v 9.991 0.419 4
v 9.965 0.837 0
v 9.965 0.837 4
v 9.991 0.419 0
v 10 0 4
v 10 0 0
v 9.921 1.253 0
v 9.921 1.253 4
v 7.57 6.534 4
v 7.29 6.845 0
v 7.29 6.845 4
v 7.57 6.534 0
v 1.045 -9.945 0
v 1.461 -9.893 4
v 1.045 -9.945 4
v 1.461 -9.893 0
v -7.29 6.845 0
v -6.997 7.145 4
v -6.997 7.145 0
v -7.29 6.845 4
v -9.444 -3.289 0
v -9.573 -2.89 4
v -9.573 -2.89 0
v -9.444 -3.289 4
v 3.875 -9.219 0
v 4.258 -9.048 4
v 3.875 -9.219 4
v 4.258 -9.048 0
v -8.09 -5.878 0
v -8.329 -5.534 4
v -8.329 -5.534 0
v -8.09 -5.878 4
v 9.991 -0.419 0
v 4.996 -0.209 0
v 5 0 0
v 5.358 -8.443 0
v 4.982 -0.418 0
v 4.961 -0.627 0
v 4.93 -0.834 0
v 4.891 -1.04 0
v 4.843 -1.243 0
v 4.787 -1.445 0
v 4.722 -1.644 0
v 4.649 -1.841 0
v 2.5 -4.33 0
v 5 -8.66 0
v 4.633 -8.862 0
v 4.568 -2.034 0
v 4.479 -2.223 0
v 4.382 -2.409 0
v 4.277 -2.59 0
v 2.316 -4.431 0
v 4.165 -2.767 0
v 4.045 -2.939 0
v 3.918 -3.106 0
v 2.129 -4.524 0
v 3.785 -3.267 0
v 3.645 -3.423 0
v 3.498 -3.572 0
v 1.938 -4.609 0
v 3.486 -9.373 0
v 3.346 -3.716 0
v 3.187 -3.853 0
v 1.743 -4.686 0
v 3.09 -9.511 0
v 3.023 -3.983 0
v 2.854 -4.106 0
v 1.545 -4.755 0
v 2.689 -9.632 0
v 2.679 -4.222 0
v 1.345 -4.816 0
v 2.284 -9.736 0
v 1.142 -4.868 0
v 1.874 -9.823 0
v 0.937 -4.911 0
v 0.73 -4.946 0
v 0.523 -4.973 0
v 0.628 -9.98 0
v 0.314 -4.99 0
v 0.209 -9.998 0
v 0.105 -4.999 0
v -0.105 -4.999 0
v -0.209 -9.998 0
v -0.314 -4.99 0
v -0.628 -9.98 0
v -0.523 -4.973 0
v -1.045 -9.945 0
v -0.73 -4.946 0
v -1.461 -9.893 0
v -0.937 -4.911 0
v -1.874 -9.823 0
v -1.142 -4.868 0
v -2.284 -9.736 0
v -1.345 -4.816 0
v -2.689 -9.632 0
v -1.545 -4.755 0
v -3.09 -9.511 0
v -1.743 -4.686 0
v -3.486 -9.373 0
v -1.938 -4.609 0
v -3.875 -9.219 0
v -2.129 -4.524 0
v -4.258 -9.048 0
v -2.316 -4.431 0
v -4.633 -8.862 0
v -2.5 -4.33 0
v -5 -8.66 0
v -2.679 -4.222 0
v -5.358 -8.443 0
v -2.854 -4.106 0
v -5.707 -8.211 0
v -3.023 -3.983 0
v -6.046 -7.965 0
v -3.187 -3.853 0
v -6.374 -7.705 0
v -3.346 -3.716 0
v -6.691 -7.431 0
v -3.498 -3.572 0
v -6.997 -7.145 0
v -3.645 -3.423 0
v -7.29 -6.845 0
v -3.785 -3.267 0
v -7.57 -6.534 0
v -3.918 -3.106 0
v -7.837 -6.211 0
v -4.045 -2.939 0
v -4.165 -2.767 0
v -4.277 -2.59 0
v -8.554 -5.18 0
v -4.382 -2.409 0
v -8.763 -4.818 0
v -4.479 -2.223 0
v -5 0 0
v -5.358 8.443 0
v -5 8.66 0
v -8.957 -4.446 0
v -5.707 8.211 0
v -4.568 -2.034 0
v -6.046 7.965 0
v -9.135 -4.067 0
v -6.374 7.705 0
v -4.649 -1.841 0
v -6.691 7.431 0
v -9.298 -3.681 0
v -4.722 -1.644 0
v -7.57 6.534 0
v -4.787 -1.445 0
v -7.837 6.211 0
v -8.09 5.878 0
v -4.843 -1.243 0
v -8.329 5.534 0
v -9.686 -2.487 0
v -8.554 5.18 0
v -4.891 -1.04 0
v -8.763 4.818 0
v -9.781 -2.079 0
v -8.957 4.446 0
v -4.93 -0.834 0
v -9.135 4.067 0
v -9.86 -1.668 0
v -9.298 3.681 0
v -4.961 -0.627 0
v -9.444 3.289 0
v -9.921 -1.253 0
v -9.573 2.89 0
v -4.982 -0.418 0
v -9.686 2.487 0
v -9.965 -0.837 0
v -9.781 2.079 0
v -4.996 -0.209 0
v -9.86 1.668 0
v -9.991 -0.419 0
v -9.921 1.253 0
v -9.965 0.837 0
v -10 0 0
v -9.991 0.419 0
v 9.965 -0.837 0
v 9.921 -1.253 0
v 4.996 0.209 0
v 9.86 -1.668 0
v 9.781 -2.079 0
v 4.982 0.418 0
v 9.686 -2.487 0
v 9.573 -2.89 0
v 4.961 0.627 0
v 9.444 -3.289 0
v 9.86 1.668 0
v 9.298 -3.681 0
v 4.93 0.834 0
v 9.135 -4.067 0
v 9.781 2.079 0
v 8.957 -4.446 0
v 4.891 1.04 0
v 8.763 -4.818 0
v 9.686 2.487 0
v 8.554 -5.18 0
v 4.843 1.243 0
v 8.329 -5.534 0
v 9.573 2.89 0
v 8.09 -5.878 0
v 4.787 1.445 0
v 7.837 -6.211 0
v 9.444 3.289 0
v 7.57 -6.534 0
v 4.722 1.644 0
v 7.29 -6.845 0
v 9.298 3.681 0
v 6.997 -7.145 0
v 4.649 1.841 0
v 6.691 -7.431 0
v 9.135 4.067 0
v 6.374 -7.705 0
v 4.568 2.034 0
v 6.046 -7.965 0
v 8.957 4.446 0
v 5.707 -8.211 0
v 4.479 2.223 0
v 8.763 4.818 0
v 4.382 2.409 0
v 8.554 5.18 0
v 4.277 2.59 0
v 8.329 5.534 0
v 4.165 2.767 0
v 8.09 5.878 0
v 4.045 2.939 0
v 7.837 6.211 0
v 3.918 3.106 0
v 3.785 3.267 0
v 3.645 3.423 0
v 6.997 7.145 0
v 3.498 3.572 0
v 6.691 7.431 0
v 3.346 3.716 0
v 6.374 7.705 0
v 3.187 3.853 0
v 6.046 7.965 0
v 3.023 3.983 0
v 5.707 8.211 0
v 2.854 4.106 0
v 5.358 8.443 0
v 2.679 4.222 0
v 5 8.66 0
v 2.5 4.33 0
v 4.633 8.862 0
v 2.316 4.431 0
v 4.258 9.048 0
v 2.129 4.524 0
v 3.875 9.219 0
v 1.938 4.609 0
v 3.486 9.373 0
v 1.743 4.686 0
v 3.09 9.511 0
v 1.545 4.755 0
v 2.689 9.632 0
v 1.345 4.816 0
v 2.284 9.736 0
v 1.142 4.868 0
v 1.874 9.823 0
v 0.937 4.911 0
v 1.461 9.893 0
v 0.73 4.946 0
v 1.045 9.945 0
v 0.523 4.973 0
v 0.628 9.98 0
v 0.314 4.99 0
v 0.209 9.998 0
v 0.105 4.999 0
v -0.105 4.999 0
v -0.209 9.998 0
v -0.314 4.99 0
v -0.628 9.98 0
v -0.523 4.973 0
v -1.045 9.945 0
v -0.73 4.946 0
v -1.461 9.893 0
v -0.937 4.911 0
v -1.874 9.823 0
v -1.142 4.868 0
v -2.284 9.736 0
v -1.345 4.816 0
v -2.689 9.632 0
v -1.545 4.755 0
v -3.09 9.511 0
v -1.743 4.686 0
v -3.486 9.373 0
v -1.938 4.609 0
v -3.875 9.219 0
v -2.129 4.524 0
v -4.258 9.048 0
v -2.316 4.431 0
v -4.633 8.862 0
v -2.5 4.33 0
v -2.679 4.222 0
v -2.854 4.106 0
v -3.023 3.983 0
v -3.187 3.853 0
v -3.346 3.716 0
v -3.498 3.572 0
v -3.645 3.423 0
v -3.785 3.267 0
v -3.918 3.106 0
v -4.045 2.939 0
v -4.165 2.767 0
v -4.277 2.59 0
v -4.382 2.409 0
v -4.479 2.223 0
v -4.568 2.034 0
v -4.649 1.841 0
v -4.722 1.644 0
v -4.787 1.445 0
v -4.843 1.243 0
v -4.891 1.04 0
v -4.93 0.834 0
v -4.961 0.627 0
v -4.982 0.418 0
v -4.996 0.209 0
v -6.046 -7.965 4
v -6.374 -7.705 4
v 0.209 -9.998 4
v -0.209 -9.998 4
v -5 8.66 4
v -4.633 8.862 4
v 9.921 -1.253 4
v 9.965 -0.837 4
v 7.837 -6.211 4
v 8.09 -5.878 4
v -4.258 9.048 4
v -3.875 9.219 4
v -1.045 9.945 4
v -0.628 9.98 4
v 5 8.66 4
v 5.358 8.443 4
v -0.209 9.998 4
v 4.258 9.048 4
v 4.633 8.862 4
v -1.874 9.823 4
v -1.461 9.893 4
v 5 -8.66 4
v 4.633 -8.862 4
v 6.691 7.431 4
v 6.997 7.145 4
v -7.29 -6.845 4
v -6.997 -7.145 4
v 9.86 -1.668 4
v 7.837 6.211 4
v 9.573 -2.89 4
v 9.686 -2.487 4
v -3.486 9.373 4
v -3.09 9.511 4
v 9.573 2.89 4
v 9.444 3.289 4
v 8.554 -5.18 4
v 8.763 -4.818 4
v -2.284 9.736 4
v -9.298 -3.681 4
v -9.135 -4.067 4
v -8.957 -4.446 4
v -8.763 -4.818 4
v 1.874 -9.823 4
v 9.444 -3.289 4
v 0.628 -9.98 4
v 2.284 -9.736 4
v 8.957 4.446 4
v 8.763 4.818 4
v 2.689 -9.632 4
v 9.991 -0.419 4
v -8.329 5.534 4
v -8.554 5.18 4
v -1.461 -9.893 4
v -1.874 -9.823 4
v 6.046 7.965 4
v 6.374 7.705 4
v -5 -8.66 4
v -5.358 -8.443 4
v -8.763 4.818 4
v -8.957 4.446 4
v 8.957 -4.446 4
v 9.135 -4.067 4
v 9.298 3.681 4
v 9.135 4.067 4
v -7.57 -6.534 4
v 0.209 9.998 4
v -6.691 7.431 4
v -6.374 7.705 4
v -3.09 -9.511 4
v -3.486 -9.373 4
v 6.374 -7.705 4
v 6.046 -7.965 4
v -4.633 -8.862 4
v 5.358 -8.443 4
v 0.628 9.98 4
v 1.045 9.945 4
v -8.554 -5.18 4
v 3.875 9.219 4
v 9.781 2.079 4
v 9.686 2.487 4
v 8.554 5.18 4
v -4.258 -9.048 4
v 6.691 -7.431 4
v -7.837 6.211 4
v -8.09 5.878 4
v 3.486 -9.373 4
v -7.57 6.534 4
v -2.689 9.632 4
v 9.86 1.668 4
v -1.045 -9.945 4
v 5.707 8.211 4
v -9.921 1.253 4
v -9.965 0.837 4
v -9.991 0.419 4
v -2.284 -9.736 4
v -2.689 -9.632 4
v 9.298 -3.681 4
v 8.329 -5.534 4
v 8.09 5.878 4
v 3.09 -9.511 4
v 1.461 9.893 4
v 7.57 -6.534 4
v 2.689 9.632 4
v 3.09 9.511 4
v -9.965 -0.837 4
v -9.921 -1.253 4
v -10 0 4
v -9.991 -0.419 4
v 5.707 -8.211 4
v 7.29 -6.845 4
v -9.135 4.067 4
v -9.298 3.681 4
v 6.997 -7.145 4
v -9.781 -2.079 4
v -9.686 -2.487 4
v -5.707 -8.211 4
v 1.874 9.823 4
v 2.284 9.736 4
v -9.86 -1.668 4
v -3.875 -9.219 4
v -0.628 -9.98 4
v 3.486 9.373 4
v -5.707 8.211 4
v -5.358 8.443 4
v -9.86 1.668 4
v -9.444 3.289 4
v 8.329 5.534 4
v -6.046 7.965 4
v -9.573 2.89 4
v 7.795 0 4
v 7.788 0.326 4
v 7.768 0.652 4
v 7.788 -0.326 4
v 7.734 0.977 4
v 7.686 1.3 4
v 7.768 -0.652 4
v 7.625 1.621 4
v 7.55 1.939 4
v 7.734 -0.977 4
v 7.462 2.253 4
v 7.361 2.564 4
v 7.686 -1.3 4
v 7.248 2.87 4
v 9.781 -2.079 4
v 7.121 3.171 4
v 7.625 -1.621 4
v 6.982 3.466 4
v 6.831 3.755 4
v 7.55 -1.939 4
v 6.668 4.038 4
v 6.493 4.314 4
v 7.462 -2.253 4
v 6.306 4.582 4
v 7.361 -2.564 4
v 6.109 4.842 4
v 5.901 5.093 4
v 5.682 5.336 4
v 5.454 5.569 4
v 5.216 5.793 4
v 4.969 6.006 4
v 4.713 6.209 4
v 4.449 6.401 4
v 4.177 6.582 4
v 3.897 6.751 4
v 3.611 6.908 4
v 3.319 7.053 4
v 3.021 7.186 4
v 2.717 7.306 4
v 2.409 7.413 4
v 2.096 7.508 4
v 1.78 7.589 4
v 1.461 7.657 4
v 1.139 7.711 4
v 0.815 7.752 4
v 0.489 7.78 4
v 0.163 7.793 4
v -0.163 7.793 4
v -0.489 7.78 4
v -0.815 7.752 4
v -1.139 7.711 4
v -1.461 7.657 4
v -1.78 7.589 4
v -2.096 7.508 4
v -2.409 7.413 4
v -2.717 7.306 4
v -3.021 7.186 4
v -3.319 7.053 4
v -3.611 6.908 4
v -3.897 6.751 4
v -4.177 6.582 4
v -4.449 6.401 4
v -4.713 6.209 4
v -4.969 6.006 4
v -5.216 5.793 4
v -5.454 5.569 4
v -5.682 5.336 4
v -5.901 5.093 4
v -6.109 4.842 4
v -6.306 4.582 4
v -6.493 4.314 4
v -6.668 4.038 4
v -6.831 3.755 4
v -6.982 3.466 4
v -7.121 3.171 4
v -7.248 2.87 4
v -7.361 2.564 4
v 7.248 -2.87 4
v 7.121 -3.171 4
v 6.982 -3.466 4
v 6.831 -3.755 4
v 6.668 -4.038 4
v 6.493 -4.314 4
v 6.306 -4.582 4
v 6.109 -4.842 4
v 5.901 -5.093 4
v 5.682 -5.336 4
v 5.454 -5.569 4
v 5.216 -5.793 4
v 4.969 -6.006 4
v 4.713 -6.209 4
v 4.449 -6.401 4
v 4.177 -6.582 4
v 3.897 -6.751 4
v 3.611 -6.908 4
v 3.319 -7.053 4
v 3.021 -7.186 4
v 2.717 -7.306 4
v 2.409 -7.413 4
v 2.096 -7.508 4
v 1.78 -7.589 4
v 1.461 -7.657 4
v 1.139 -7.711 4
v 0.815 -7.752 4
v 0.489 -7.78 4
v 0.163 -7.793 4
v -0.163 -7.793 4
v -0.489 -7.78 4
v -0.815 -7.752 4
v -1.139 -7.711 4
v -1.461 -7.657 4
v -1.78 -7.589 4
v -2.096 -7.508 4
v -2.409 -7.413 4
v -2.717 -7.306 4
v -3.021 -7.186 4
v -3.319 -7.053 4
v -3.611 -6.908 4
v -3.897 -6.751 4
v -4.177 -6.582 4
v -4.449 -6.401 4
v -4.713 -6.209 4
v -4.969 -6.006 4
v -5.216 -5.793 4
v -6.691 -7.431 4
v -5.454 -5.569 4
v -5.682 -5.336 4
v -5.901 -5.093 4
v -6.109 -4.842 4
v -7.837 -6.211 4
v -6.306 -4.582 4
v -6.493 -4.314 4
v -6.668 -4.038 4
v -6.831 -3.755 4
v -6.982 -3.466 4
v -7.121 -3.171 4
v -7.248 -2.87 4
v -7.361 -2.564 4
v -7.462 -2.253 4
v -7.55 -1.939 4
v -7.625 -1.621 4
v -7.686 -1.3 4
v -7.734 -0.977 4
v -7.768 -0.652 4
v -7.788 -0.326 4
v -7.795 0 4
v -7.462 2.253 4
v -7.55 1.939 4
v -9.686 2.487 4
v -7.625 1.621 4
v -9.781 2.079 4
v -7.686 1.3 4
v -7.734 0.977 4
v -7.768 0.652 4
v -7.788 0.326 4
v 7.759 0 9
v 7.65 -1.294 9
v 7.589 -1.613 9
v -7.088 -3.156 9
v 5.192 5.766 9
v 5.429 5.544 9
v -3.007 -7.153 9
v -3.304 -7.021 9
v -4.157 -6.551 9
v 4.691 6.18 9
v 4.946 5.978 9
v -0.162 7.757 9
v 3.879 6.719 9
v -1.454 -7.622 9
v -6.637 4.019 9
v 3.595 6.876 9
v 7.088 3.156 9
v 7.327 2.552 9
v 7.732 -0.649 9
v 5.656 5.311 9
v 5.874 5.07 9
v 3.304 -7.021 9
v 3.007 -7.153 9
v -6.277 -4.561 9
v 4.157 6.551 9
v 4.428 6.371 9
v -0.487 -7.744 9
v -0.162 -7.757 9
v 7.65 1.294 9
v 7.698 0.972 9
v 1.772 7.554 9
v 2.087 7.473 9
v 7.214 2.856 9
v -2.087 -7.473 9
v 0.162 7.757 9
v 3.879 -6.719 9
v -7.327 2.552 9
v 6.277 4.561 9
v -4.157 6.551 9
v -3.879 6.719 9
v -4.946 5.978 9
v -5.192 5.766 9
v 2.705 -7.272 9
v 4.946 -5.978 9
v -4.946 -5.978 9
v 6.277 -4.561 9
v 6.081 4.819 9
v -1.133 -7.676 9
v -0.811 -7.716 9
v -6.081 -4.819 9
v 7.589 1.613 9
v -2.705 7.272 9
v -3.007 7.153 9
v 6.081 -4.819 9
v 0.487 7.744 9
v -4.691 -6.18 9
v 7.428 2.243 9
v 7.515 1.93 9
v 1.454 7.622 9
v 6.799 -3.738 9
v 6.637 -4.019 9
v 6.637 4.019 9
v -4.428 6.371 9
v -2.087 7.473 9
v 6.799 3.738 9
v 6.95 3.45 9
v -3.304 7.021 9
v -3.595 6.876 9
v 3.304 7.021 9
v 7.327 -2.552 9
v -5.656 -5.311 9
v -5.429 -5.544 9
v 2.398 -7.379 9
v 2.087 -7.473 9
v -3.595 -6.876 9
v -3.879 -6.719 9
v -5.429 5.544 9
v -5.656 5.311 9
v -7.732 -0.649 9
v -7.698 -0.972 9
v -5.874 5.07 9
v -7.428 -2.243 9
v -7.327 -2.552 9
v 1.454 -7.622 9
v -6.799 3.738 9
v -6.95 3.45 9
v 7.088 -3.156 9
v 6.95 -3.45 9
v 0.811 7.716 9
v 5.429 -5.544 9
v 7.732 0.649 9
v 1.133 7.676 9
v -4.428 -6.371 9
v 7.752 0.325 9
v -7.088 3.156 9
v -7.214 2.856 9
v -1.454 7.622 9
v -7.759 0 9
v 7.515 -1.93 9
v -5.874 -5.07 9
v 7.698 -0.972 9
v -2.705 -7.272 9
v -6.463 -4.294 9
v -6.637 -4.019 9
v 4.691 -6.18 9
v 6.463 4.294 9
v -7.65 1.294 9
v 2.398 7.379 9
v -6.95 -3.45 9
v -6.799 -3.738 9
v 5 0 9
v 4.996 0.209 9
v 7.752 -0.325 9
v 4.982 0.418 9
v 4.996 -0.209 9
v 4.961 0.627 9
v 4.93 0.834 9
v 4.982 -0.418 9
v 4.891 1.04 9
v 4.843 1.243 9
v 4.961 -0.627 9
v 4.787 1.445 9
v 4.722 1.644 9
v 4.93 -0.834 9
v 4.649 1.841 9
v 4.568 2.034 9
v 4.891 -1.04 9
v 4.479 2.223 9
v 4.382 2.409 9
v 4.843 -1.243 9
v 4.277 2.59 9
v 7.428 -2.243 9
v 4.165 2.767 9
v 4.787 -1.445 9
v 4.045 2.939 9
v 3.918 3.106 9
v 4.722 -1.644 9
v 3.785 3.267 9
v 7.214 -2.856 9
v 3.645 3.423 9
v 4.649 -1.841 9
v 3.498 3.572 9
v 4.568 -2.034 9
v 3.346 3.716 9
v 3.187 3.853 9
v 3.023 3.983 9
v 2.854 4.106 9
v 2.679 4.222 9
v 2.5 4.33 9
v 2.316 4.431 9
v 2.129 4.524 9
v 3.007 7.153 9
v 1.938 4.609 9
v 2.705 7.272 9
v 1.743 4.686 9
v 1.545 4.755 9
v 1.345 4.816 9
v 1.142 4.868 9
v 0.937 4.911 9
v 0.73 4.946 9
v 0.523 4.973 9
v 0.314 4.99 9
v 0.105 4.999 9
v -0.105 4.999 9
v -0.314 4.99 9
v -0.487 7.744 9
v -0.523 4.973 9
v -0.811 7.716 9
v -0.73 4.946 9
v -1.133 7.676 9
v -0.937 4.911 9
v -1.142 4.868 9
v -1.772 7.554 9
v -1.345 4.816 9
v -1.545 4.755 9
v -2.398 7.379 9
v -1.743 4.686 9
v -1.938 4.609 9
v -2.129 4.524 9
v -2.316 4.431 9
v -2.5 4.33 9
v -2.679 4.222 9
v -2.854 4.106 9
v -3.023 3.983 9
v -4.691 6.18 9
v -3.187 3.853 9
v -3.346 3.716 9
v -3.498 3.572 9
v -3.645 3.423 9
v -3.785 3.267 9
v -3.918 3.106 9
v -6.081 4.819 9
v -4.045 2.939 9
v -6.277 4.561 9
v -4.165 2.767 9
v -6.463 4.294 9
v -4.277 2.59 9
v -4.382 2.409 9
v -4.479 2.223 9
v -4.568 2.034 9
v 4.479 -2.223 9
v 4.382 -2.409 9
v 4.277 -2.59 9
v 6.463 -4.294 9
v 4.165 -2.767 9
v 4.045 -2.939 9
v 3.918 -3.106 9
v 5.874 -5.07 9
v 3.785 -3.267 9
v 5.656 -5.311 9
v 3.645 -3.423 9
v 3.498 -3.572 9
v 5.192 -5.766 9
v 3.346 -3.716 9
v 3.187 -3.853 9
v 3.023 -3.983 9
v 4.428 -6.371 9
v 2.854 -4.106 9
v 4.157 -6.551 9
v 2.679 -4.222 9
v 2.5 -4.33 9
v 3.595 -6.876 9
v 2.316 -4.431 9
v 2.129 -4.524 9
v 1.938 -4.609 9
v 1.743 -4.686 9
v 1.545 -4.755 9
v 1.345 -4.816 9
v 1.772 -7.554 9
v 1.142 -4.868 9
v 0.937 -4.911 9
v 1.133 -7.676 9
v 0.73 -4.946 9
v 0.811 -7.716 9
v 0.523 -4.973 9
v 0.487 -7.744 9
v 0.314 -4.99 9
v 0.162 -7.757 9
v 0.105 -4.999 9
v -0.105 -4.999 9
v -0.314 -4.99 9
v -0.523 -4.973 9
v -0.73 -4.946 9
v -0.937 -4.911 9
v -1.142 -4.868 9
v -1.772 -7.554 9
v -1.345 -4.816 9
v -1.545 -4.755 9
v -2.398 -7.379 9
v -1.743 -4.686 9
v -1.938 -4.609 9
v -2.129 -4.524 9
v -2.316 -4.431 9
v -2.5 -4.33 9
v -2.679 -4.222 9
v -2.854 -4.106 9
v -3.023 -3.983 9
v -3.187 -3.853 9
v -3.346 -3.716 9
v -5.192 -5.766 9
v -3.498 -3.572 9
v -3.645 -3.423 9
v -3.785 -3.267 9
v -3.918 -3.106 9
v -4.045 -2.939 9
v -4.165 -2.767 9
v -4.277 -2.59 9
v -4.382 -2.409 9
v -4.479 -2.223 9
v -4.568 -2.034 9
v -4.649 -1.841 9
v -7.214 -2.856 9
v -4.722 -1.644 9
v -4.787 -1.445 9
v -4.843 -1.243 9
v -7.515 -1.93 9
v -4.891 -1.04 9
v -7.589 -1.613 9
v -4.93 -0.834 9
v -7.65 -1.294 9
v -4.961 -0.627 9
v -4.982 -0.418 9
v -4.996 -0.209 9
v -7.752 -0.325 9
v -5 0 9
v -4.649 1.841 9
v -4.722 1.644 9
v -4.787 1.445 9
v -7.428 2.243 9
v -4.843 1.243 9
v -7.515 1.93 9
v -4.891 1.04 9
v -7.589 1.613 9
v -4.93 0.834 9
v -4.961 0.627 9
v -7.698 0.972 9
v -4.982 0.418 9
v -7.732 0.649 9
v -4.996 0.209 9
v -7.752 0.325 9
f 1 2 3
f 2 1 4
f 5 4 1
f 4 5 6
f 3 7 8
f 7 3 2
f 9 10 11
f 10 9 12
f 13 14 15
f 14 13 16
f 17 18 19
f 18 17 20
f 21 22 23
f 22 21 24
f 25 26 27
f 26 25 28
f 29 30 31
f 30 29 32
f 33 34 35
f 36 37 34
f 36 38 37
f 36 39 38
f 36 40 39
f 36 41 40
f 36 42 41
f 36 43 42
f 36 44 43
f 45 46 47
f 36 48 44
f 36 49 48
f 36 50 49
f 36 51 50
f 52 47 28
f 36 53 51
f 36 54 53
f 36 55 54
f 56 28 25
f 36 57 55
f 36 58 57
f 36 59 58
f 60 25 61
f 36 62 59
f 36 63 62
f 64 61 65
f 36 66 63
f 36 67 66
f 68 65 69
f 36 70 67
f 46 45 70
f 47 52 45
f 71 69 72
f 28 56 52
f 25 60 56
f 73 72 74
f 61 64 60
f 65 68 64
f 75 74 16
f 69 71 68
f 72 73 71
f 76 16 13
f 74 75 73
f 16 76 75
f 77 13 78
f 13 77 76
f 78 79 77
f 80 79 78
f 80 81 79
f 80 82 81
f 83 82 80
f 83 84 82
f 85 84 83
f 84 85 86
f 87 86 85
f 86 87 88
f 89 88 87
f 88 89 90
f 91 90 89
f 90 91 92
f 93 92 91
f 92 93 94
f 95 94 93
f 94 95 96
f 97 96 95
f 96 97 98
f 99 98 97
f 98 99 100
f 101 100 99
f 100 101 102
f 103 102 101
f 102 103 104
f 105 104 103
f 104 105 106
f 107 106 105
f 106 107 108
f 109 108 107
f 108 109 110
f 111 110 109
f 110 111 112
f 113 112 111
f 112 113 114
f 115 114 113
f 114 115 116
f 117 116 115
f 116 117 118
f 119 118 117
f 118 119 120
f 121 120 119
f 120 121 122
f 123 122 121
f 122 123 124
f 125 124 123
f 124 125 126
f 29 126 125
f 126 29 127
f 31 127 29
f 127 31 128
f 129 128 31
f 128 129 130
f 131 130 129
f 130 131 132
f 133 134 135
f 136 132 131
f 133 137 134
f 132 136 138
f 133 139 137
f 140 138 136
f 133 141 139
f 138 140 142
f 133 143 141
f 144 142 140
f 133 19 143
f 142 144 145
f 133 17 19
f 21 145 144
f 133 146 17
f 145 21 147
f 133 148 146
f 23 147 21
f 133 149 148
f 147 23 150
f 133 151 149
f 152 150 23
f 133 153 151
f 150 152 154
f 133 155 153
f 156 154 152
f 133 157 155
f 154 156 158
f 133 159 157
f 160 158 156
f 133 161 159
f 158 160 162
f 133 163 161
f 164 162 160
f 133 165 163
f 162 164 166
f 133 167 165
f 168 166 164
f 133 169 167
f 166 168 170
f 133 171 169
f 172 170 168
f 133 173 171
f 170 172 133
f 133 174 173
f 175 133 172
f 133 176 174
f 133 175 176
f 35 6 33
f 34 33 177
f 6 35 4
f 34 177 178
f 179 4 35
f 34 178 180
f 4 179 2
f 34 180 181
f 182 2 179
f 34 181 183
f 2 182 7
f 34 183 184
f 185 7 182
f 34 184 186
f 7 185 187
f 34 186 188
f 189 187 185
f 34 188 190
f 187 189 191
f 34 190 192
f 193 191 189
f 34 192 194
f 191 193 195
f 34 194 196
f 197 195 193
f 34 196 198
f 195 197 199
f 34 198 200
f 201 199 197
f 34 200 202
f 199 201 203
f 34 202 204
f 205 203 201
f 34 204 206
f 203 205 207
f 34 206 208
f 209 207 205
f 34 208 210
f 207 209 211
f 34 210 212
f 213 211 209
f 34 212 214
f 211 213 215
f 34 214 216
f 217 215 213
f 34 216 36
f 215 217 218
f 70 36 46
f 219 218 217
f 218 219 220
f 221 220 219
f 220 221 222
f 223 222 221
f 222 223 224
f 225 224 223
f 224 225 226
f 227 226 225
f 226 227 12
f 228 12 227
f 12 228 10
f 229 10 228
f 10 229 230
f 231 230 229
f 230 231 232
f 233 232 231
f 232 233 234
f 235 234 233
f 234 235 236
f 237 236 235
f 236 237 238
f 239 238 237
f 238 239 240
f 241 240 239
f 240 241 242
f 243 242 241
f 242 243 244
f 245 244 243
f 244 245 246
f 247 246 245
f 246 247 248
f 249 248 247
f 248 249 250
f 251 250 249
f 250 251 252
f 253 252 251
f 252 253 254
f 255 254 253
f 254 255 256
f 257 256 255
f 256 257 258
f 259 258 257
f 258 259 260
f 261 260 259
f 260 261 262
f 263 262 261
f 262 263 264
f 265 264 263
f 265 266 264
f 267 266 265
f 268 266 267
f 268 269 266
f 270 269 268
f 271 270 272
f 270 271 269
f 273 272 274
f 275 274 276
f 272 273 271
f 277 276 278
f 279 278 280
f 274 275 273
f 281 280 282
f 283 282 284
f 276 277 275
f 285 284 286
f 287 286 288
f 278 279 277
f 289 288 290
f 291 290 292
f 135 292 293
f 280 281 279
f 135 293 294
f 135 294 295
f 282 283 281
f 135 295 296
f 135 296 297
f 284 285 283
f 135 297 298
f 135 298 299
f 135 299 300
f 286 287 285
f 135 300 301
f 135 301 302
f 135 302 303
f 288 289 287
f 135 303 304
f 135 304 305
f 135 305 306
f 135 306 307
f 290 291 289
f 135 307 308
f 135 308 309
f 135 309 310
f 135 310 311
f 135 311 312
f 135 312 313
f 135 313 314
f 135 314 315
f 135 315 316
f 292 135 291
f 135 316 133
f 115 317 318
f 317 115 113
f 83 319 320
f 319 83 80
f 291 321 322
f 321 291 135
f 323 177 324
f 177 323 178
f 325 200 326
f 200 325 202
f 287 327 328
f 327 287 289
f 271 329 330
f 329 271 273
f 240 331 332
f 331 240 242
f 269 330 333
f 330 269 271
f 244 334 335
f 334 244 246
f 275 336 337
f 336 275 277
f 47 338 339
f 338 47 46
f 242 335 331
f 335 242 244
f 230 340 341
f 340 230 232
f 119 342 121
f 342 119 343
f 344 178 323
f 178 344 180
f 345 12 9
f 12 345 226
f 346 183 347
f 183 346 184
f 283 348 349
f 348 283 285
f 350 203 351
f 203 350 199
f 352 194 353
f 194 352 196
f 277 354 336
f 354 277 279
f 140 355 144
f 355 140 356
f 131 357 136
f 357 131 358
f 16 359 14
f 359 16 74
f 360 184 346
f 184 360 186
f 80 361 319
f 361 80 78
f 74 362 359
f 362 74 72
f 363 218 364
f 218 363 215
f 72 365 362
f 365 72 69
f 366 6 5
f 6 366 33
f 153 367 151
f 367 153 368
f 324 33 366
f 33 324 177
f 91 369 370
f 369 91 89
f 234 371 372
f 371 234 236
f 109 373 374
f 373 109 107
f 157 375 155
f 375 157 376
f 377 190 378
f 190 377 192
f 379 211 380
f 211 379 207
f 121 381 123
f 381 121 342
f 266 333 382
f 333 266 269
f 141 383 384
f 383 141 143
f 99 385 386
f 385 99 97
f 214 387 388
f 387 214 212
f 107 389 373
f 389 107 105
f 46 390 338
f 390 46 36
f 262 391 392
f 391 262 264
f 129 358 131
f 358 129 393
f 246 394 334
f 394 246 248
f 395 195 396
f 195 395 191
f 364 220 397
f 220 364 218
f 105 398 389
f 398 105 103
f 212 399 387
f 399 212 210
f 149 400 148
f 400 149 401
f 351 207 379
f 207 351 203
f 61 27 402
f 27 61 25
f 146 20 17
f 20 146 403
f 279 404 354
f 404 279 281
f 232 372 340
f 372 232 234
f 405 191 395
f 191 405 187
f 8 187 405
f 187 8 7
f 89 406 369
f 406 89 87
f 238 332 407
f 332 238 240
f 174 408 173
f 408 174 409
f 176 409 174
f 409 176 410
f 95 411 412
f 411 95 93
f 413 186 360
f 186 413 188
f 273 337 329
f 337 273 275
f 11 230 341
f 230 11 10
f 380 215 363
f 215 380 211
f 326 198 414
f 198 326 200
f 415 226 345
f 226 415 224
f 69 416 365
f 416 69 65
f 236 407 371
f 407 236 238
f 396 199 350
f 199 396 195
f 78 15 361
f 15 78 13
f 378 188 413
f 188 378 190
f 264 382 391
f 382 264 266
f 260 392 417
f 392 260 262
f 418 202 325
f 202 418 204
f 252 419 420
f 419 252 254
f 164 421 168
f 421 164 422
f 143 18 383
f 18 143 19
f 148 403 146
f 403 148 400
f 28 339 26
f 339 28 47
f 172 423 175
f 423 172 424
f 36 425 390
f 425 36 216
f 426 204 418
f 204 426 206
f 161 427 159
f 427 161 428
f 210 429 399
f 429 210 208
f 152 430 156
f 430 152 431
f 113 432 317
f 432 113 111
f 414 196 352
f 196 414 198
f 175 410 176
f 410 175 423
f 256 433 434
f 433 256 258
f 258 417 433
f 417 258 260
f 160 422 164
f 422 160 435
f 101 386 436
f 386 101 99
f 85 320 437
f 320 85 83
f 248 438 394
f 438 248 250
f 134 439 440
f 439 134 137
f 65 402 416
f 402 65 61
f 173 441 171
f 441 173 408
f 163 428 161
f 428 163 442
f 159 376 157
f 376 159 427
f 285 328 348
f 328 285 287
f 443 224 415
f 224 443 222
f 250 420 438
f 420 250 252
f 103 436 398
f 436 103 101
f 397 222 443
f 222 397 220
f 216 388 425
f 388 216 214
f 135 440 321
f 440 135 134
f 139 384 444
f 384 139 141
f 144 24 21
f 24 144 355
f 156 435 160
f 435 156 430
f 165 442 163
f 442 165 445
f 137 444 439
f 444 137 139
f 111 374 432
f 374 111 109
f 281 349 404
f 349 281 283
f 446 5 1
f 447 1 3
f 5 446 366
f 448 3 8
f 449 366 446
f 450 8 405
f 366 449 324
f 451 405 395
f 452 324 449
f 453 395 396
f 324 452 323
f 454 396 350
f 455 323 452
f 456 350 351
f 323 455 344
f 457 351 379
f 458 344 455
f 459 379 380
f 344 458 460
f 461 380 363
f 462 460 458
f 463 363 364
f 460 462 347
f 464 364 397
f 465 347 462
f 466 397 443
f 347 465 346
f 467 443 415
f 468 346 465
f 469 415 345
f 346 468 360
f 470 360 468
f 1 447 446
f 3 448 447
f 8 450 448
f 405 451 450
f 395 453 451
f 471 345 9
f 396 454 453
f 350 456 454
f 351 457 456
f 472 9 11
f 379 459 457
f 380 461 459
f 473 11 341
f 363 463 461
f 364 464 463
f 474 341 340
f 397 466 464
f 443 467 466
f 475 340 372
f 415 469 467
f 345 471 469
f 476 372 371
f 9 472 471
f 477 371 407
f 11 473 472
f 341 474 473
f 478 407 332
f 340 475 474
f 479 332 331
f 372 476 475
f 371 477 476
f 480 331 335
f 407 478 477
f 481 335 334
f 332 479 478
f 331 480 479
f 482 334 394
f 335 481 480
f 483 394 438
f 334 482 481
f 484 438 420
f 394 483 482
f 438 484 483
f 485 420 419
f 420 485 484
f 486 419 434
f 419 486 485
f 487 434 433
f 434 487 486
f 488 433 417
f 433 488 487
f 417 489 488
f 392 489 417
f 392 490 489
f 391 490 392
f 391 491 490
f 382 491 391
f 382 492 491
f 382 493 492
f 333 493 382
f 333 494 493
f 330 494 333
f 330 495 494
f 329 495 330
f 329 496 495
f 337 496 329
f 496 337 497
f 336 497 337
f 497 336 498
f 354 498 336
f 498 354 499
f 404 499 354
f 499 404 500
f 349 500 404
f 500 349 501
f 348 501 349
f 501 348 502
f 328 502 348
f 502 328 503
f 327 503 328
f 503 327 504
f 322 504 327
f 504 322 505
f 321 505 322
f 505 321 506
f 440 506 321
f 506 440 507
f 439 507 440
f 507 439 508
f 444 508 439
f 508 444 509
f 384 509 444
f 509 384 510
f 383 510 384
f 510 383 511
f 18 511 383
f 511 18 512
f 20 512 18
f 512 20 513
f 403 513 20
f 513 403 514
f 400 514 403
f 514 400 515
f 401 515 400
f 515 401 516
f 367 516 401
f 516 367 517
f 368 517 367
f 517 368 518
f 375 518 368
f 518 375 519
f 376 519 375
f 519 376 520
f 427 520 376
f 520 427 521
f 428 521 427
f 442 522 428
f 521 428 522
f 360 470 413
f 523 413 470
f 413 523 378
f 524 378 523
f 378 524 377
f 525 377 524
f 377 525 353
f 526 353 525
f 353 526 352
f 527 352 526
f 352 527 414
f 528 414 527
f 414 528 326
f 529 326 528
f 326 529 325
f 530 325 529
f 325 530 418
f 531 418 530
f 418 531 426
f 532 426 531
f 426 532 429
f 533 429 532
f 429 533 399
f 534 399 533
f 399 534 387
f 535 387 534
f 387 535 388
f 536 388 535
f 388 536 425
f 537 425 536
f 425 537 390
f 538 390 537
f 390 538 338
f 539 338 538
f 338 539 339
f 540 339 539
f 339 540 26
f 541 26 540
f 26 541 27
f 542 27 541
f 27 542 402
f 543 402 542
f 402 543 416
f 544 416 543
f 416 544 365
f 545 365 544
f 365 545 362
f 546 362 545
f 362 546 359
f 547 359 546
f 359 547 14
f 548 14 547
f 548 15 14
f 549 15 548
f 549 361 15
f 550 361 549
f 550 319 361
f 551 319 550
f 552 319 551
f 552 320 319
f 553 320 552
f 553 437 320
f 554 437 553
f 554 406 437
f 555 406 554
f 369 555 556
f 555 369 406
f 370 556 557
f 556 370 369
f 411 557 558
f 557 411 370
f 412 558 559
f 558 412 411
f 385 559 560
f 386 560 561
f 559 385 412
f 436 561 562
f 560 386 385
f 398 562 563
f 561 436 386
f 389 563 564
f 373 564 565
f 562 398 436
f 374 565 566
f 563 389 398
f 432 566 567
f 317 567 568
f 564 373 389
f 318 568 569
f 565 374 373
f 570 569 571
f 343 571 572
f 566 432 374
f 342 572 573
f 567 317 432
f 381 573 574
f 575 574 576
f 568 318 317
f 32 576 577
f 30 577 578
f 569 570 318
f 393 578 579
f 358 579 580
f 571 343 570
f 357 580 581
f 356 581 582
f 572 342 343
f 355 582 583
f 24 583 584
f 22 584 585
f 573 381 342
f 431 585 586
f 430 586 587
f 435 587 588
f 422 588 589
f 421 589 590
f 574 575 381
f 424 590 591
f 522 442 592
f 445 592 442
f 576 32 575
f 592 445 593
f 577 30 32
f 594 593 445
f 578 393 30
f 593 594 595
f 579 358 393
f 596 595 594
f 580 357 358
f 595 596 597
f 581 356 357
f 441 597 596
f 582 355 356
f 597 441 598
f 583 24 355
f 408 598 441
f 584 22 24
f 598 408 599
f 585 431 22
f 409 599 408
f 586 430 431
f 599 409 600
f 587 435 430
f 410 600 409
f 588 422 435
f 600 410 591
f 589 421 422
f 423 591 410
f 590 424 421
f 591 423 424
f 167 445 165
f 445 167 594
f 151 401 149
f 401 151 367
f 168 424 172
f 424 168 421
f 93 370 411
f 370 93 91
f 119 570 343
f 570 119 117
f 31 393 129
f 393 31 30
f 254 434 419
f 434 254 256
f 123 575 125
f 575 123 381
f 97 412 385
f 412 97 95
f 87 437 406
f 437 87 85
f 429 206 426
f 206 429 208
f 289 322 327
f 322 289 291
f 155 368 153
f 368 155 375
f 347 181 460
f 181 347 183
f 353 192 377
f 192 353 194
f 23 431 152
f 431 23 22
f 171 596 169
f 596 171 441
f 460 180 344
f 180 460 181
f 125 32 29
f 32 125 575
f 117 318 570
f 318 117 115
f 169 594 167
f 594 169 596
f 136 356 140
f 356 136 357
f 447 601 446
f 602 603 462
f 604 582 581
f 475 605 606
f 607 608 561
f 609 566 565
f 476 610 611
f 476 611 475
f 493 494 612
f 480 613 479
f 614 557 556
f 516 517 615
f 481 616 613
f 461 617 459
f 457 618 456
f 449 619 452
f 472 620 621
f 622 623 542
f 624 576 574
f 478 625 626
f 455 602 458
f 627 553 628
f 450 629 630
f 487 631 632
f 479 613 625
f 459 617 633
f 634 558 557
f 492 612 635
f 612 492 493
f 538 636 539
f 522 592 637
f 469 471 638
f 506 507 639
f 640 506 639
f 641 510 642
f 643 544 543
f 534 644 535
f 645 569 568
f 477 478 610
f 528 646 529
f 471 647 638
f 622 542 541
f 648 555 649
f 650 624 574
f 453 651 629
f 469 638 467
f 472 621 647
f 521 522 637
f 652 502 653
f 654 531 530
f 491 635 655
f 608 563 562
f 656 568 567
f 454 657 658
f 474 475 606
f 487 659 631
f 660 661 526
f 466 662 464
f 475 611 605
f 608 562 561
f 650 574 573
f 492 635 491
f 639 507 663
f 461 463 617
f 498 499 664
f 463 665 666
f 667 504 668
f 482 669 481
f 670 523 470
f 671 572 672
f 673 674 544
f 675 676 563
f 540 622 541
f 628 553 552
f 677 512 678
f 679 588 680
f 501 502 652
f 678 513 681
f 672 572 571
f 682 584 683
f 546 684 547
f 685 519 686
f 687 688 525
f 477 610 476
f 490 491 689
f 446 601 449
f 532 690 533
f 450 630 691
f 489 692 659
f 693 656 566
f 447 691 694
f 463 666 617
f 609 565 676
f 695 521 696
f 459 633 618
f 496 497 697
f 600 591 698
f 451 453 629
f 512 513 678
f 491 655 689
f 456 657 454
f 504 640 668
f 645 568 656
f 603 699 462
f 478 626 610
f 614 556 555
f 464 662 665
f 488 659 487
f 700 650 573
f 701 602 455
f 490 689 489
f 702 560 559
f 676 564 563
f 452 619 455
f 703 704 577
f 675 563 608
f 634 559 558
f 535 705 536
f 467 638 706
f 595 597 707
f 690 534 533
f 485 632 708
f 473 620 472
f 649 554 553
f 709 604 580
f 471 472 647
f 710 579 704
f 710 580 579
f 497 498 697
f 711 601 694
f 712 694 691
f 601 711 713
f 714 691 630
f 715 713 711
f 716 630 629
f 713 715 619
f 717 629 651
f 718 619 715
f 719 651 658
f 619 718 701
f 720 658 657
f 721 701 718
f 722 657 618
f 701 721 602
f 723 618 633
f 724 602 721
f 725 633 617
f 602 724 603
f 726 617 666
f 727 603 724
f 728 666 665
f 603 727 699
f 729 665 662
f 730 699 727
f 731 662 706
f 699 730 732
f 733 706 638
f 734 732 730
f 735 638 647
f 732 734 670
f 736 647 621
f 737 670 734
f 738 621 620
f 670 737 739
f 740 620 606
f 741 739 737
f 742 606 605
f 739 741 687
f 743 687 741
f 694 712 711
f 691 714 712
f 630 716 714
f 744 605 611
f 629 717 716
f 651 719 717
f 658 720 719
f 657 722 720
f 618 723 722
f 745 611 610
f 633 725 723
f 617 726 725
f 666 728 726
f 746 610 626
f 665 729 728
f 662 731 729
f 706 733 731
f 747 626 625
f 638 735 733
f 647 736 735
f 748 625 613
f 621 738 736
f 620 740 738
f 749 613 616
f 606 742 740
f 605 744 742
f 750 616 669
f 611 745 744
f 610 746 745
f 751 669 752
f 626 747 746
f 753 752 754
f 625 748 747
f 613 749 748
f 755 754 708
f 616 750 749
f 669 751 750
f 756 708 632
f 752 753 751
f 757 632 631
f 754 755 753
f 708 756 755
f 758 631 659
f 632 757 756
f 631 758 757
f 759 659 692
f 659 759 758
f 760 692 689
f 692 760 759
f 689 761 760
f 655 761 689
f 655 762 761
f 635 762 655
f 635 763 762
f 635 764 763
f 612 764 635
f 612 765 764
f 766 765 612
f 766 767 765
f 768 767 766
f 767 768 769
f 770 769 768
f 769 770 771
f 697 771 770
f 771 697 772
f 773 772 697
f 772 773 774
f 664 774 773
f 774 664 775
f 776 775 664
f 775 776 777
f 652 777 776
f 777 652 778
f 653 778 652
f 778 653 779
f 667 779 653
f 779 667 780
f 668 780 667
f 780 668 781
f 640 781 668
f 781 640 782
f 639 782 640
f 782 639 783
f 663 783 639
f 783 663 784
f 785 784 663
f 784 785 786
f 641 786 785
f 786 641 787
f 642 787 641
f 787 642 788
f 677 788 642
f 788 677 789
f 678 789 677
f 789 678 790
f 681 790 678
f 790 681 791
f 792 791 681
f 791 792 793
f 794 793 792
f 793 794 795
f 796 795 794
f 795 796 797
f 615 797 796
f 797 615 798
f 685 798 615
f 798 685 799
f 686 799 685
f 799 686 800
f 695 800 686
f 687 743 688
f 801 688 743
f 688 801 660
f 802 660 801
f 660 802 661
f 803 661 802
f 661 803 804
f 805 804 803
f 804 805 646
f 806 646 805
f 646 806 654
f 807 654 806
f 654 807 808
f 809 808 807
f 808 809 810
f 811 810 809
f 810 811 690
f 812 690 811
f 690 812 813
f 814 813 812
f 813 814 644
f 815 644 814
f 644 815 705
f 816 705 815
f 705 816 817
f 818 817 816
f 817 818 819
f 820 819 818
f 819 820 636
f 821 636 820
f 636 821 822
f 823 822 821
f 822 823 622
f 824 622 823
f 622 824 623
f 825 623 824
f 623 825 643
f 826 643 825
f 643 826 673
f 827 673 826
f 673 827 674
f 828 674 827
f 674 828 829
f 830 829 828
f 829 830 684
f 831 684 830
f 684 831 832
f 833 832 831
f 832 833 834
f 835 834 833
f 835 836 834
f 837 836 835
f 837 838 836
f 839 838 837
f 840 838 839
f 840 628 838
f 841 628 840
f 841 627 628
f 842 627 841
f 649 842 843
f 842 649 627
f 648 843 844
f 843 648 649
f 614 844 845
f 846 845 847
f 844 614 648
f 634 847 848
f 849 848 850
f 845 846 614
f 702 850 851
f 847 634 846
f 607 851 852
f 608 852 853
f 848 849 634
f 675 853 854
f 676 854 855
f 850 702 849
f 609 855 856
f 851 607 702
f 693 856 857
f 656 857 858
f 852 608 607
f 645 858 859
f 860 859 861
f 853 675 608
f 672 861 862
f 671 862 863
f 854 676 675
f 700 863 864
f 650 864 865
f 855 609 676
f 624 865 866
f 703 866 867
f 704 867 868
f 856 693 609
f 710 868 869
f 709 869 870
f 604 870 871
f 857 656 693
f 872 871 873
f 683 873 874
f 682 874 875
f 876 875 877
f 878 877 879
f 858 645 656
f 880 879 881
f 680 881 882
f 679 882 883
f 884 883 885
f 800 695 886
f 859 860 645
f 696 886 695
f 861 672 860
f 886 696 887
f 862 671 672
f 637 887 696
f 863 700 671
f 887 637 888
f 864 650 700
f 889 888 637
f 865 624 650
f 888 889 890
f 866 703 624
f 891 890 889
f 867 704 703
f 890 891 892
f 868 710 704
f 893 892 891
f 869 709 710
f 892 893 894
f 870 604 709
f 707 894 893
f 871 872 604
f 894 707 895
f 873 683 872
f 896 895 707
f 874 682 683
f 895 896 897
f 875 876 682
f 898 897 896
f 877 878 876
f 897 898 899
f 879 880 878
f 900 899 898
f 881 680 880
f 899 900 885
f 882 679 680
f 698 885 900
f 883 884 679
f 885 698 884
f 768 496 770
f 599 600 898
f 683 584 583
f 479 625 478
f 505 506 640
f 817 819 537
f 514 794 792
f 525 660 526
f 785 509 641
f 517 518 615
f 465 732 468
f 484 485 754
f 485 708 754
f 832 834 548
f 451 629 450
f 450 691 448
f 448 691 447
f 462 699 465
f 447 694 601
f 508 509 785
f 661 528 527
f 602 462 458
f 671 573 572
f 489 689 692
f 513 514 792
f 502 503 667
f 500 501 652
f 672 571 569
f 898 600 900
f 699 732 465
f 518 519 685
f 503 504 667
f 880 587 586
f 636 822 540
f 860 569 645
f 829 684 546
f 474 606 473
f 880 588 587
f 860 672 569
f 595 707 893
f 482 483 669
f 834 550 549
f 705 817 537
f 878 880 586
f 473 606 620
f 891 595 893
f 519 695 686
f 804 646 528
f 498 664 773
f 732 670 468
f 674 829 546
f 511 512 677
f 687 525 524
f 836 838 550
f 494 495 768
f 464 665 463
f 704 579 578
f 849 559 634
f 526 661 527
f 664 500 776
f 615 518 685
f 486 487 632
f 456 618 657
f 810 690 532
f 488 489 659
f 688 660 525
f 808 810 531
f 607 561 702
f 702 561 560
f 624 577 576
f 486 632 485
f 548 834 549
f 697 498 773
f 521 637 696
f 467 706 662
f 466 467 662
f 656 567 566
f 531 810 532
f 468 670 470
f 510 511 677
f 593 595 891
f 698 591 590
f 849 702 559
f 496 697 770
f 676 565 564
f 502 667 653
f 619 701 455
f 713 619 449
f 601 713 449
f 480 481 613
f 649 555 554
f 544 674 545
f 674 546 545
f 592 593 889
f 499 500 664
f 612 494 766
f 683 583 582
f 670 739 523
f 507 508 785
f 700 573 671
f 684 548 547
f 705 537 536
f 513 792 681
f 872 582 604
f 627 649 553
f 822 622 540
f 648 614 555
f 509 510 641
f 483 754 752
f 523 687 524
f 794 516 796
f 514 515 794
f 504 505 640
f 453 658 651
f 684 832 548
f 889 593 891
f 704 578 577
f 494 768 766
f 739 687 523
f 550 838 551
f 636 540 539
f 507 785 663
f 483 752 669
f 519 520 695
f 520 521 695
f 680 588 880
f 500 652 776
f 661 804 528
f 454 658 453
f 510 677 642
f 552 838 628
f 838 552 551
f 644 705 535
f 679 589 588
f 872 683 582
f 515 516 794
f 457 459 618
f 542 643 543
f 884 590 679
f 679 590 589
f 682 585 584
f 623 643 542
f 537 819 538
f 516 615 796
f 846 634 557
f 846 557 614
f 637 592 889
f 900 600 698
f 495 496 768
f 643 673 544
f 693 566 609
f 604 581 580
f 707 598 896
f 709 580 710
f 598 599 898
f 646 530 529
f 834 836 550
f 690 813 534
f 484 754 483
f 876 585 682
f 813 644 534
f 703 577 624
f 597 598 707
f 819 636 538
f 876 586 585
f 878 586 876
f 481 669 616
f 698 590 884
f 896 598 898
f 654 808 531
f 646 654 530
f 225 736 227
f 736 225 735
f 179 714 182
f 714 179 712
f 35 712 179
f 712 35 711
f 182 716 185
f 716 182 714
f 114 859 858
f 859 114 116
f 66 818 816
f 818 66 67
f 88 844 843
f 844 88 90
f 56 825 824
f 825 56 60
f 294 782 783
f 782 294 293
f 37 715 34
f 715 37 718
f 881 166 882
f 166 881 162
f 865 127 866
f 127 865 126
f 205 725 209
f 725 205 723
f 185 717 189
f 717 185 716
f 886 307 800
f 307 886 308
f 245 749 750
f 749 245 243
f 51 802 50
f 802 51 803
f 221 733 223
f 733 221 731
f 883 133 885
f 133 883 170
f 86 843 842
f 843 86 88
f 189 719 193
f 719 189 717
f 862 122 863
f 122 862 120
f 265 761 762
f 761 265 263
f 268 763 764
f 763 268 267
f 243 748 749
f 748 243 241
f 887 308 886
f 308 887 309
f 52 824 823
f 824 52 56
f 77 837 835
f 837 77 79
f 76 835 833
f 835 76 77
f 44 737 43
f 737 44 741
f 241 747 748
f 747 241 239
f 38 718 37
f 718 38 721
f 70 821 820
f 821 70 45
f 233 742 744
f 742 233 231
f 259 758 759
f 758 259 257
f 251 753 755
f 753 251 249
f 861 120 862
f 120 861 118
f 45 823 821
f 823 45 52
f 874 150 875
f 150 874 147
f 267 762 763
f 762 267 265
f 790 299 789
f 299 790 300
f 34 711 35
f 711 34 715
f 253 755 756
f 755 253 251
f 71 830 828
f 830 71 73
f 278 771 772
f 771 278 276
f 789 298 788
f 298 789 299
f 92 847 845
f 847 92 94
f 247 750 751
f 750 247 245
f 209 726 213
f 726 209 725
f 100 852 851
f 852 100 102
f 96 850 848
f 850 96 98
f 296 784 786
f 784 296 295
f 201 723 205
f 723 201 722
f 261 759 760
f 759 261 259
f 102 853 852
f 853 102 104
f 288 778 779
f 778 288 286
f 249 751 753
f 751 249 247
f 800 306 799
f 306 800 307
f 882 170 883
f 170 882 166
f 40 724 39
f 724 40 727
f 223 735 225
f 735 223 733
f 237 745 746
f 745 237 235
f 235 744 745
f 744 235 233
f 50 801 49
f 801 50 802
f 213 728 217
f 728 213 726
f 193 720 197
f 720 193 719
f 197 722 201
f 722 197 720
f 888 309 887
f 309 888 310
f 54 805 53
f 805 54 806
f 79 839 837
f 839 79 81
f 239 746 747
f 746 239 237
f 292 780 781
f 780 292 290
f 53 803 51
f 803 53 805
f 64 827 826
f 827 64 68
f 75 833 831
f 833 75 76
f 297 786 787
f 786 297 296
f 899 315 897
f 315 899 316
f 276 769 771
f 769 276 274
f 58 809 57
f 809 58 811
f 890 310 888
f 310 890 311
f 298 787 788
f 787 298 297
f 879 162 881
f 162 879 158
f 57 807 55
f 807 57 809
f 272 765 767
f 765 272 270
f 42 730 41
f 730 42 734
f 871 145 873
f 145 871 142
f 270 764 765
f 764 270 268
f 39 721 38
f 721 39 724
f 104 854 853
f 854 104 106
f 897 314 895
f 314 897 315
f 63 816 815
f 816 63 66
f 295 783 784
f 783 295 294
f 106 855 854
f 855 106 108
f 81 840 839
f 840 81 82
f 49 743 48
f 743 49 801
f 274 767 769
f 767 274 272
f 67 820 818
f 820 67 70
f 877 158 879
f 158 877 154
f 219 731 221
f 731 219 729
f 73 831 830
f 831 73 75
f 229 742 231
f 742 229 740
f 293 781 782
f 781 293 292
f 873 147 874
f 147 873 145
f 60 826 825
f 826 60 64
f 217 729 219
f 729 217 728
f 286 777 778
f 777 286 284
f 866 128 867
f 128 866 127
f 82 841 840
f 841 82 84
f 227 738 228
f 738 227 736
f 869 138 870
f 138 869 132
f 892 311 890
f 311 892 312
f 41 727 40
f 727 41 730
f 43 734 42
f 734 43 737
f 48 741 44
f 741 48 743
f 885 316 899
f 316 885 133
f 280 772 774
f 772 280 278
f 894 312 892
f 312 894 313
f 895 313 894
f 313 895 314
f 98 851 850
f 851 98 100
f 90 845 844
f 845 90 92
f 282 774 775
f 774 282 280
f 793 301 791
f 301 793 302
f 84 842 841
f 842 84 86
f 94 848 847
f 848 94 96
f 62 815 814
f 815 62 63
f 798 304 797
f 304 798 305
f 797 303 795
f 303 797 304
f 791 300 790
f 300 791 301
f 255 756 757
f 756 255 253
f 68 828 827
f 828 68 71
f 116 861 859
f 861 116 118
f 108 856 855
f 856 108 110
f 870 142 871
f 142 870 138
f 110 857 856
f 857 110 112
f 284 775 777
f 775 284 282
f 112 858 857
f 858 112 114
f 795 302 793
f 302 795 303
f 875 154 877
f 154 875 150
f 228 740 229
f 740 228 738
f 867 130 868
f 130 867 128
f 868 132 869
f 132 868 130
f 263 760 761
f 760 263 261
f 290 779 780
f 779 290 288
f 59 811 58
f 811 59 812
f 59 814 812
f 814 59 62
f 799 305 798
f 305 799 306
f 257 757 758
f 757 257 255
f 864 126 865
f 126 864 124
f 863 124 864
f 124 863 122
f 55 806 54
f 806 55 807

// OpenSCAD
difference() {
    
union() {
    
translate(v = [0, 0, 2]) {


cylinder(4,10,10,$fn = 150, center= true);}


translate(v = [0, 0, 6.5]) {


cylinder(5,7.795,7.759,$fn = 150, center= true);}
}

translate(v = [0, 0,4.5]) {

cylinder (h = 14, r=5, center = true, $fn=150);




}

}
